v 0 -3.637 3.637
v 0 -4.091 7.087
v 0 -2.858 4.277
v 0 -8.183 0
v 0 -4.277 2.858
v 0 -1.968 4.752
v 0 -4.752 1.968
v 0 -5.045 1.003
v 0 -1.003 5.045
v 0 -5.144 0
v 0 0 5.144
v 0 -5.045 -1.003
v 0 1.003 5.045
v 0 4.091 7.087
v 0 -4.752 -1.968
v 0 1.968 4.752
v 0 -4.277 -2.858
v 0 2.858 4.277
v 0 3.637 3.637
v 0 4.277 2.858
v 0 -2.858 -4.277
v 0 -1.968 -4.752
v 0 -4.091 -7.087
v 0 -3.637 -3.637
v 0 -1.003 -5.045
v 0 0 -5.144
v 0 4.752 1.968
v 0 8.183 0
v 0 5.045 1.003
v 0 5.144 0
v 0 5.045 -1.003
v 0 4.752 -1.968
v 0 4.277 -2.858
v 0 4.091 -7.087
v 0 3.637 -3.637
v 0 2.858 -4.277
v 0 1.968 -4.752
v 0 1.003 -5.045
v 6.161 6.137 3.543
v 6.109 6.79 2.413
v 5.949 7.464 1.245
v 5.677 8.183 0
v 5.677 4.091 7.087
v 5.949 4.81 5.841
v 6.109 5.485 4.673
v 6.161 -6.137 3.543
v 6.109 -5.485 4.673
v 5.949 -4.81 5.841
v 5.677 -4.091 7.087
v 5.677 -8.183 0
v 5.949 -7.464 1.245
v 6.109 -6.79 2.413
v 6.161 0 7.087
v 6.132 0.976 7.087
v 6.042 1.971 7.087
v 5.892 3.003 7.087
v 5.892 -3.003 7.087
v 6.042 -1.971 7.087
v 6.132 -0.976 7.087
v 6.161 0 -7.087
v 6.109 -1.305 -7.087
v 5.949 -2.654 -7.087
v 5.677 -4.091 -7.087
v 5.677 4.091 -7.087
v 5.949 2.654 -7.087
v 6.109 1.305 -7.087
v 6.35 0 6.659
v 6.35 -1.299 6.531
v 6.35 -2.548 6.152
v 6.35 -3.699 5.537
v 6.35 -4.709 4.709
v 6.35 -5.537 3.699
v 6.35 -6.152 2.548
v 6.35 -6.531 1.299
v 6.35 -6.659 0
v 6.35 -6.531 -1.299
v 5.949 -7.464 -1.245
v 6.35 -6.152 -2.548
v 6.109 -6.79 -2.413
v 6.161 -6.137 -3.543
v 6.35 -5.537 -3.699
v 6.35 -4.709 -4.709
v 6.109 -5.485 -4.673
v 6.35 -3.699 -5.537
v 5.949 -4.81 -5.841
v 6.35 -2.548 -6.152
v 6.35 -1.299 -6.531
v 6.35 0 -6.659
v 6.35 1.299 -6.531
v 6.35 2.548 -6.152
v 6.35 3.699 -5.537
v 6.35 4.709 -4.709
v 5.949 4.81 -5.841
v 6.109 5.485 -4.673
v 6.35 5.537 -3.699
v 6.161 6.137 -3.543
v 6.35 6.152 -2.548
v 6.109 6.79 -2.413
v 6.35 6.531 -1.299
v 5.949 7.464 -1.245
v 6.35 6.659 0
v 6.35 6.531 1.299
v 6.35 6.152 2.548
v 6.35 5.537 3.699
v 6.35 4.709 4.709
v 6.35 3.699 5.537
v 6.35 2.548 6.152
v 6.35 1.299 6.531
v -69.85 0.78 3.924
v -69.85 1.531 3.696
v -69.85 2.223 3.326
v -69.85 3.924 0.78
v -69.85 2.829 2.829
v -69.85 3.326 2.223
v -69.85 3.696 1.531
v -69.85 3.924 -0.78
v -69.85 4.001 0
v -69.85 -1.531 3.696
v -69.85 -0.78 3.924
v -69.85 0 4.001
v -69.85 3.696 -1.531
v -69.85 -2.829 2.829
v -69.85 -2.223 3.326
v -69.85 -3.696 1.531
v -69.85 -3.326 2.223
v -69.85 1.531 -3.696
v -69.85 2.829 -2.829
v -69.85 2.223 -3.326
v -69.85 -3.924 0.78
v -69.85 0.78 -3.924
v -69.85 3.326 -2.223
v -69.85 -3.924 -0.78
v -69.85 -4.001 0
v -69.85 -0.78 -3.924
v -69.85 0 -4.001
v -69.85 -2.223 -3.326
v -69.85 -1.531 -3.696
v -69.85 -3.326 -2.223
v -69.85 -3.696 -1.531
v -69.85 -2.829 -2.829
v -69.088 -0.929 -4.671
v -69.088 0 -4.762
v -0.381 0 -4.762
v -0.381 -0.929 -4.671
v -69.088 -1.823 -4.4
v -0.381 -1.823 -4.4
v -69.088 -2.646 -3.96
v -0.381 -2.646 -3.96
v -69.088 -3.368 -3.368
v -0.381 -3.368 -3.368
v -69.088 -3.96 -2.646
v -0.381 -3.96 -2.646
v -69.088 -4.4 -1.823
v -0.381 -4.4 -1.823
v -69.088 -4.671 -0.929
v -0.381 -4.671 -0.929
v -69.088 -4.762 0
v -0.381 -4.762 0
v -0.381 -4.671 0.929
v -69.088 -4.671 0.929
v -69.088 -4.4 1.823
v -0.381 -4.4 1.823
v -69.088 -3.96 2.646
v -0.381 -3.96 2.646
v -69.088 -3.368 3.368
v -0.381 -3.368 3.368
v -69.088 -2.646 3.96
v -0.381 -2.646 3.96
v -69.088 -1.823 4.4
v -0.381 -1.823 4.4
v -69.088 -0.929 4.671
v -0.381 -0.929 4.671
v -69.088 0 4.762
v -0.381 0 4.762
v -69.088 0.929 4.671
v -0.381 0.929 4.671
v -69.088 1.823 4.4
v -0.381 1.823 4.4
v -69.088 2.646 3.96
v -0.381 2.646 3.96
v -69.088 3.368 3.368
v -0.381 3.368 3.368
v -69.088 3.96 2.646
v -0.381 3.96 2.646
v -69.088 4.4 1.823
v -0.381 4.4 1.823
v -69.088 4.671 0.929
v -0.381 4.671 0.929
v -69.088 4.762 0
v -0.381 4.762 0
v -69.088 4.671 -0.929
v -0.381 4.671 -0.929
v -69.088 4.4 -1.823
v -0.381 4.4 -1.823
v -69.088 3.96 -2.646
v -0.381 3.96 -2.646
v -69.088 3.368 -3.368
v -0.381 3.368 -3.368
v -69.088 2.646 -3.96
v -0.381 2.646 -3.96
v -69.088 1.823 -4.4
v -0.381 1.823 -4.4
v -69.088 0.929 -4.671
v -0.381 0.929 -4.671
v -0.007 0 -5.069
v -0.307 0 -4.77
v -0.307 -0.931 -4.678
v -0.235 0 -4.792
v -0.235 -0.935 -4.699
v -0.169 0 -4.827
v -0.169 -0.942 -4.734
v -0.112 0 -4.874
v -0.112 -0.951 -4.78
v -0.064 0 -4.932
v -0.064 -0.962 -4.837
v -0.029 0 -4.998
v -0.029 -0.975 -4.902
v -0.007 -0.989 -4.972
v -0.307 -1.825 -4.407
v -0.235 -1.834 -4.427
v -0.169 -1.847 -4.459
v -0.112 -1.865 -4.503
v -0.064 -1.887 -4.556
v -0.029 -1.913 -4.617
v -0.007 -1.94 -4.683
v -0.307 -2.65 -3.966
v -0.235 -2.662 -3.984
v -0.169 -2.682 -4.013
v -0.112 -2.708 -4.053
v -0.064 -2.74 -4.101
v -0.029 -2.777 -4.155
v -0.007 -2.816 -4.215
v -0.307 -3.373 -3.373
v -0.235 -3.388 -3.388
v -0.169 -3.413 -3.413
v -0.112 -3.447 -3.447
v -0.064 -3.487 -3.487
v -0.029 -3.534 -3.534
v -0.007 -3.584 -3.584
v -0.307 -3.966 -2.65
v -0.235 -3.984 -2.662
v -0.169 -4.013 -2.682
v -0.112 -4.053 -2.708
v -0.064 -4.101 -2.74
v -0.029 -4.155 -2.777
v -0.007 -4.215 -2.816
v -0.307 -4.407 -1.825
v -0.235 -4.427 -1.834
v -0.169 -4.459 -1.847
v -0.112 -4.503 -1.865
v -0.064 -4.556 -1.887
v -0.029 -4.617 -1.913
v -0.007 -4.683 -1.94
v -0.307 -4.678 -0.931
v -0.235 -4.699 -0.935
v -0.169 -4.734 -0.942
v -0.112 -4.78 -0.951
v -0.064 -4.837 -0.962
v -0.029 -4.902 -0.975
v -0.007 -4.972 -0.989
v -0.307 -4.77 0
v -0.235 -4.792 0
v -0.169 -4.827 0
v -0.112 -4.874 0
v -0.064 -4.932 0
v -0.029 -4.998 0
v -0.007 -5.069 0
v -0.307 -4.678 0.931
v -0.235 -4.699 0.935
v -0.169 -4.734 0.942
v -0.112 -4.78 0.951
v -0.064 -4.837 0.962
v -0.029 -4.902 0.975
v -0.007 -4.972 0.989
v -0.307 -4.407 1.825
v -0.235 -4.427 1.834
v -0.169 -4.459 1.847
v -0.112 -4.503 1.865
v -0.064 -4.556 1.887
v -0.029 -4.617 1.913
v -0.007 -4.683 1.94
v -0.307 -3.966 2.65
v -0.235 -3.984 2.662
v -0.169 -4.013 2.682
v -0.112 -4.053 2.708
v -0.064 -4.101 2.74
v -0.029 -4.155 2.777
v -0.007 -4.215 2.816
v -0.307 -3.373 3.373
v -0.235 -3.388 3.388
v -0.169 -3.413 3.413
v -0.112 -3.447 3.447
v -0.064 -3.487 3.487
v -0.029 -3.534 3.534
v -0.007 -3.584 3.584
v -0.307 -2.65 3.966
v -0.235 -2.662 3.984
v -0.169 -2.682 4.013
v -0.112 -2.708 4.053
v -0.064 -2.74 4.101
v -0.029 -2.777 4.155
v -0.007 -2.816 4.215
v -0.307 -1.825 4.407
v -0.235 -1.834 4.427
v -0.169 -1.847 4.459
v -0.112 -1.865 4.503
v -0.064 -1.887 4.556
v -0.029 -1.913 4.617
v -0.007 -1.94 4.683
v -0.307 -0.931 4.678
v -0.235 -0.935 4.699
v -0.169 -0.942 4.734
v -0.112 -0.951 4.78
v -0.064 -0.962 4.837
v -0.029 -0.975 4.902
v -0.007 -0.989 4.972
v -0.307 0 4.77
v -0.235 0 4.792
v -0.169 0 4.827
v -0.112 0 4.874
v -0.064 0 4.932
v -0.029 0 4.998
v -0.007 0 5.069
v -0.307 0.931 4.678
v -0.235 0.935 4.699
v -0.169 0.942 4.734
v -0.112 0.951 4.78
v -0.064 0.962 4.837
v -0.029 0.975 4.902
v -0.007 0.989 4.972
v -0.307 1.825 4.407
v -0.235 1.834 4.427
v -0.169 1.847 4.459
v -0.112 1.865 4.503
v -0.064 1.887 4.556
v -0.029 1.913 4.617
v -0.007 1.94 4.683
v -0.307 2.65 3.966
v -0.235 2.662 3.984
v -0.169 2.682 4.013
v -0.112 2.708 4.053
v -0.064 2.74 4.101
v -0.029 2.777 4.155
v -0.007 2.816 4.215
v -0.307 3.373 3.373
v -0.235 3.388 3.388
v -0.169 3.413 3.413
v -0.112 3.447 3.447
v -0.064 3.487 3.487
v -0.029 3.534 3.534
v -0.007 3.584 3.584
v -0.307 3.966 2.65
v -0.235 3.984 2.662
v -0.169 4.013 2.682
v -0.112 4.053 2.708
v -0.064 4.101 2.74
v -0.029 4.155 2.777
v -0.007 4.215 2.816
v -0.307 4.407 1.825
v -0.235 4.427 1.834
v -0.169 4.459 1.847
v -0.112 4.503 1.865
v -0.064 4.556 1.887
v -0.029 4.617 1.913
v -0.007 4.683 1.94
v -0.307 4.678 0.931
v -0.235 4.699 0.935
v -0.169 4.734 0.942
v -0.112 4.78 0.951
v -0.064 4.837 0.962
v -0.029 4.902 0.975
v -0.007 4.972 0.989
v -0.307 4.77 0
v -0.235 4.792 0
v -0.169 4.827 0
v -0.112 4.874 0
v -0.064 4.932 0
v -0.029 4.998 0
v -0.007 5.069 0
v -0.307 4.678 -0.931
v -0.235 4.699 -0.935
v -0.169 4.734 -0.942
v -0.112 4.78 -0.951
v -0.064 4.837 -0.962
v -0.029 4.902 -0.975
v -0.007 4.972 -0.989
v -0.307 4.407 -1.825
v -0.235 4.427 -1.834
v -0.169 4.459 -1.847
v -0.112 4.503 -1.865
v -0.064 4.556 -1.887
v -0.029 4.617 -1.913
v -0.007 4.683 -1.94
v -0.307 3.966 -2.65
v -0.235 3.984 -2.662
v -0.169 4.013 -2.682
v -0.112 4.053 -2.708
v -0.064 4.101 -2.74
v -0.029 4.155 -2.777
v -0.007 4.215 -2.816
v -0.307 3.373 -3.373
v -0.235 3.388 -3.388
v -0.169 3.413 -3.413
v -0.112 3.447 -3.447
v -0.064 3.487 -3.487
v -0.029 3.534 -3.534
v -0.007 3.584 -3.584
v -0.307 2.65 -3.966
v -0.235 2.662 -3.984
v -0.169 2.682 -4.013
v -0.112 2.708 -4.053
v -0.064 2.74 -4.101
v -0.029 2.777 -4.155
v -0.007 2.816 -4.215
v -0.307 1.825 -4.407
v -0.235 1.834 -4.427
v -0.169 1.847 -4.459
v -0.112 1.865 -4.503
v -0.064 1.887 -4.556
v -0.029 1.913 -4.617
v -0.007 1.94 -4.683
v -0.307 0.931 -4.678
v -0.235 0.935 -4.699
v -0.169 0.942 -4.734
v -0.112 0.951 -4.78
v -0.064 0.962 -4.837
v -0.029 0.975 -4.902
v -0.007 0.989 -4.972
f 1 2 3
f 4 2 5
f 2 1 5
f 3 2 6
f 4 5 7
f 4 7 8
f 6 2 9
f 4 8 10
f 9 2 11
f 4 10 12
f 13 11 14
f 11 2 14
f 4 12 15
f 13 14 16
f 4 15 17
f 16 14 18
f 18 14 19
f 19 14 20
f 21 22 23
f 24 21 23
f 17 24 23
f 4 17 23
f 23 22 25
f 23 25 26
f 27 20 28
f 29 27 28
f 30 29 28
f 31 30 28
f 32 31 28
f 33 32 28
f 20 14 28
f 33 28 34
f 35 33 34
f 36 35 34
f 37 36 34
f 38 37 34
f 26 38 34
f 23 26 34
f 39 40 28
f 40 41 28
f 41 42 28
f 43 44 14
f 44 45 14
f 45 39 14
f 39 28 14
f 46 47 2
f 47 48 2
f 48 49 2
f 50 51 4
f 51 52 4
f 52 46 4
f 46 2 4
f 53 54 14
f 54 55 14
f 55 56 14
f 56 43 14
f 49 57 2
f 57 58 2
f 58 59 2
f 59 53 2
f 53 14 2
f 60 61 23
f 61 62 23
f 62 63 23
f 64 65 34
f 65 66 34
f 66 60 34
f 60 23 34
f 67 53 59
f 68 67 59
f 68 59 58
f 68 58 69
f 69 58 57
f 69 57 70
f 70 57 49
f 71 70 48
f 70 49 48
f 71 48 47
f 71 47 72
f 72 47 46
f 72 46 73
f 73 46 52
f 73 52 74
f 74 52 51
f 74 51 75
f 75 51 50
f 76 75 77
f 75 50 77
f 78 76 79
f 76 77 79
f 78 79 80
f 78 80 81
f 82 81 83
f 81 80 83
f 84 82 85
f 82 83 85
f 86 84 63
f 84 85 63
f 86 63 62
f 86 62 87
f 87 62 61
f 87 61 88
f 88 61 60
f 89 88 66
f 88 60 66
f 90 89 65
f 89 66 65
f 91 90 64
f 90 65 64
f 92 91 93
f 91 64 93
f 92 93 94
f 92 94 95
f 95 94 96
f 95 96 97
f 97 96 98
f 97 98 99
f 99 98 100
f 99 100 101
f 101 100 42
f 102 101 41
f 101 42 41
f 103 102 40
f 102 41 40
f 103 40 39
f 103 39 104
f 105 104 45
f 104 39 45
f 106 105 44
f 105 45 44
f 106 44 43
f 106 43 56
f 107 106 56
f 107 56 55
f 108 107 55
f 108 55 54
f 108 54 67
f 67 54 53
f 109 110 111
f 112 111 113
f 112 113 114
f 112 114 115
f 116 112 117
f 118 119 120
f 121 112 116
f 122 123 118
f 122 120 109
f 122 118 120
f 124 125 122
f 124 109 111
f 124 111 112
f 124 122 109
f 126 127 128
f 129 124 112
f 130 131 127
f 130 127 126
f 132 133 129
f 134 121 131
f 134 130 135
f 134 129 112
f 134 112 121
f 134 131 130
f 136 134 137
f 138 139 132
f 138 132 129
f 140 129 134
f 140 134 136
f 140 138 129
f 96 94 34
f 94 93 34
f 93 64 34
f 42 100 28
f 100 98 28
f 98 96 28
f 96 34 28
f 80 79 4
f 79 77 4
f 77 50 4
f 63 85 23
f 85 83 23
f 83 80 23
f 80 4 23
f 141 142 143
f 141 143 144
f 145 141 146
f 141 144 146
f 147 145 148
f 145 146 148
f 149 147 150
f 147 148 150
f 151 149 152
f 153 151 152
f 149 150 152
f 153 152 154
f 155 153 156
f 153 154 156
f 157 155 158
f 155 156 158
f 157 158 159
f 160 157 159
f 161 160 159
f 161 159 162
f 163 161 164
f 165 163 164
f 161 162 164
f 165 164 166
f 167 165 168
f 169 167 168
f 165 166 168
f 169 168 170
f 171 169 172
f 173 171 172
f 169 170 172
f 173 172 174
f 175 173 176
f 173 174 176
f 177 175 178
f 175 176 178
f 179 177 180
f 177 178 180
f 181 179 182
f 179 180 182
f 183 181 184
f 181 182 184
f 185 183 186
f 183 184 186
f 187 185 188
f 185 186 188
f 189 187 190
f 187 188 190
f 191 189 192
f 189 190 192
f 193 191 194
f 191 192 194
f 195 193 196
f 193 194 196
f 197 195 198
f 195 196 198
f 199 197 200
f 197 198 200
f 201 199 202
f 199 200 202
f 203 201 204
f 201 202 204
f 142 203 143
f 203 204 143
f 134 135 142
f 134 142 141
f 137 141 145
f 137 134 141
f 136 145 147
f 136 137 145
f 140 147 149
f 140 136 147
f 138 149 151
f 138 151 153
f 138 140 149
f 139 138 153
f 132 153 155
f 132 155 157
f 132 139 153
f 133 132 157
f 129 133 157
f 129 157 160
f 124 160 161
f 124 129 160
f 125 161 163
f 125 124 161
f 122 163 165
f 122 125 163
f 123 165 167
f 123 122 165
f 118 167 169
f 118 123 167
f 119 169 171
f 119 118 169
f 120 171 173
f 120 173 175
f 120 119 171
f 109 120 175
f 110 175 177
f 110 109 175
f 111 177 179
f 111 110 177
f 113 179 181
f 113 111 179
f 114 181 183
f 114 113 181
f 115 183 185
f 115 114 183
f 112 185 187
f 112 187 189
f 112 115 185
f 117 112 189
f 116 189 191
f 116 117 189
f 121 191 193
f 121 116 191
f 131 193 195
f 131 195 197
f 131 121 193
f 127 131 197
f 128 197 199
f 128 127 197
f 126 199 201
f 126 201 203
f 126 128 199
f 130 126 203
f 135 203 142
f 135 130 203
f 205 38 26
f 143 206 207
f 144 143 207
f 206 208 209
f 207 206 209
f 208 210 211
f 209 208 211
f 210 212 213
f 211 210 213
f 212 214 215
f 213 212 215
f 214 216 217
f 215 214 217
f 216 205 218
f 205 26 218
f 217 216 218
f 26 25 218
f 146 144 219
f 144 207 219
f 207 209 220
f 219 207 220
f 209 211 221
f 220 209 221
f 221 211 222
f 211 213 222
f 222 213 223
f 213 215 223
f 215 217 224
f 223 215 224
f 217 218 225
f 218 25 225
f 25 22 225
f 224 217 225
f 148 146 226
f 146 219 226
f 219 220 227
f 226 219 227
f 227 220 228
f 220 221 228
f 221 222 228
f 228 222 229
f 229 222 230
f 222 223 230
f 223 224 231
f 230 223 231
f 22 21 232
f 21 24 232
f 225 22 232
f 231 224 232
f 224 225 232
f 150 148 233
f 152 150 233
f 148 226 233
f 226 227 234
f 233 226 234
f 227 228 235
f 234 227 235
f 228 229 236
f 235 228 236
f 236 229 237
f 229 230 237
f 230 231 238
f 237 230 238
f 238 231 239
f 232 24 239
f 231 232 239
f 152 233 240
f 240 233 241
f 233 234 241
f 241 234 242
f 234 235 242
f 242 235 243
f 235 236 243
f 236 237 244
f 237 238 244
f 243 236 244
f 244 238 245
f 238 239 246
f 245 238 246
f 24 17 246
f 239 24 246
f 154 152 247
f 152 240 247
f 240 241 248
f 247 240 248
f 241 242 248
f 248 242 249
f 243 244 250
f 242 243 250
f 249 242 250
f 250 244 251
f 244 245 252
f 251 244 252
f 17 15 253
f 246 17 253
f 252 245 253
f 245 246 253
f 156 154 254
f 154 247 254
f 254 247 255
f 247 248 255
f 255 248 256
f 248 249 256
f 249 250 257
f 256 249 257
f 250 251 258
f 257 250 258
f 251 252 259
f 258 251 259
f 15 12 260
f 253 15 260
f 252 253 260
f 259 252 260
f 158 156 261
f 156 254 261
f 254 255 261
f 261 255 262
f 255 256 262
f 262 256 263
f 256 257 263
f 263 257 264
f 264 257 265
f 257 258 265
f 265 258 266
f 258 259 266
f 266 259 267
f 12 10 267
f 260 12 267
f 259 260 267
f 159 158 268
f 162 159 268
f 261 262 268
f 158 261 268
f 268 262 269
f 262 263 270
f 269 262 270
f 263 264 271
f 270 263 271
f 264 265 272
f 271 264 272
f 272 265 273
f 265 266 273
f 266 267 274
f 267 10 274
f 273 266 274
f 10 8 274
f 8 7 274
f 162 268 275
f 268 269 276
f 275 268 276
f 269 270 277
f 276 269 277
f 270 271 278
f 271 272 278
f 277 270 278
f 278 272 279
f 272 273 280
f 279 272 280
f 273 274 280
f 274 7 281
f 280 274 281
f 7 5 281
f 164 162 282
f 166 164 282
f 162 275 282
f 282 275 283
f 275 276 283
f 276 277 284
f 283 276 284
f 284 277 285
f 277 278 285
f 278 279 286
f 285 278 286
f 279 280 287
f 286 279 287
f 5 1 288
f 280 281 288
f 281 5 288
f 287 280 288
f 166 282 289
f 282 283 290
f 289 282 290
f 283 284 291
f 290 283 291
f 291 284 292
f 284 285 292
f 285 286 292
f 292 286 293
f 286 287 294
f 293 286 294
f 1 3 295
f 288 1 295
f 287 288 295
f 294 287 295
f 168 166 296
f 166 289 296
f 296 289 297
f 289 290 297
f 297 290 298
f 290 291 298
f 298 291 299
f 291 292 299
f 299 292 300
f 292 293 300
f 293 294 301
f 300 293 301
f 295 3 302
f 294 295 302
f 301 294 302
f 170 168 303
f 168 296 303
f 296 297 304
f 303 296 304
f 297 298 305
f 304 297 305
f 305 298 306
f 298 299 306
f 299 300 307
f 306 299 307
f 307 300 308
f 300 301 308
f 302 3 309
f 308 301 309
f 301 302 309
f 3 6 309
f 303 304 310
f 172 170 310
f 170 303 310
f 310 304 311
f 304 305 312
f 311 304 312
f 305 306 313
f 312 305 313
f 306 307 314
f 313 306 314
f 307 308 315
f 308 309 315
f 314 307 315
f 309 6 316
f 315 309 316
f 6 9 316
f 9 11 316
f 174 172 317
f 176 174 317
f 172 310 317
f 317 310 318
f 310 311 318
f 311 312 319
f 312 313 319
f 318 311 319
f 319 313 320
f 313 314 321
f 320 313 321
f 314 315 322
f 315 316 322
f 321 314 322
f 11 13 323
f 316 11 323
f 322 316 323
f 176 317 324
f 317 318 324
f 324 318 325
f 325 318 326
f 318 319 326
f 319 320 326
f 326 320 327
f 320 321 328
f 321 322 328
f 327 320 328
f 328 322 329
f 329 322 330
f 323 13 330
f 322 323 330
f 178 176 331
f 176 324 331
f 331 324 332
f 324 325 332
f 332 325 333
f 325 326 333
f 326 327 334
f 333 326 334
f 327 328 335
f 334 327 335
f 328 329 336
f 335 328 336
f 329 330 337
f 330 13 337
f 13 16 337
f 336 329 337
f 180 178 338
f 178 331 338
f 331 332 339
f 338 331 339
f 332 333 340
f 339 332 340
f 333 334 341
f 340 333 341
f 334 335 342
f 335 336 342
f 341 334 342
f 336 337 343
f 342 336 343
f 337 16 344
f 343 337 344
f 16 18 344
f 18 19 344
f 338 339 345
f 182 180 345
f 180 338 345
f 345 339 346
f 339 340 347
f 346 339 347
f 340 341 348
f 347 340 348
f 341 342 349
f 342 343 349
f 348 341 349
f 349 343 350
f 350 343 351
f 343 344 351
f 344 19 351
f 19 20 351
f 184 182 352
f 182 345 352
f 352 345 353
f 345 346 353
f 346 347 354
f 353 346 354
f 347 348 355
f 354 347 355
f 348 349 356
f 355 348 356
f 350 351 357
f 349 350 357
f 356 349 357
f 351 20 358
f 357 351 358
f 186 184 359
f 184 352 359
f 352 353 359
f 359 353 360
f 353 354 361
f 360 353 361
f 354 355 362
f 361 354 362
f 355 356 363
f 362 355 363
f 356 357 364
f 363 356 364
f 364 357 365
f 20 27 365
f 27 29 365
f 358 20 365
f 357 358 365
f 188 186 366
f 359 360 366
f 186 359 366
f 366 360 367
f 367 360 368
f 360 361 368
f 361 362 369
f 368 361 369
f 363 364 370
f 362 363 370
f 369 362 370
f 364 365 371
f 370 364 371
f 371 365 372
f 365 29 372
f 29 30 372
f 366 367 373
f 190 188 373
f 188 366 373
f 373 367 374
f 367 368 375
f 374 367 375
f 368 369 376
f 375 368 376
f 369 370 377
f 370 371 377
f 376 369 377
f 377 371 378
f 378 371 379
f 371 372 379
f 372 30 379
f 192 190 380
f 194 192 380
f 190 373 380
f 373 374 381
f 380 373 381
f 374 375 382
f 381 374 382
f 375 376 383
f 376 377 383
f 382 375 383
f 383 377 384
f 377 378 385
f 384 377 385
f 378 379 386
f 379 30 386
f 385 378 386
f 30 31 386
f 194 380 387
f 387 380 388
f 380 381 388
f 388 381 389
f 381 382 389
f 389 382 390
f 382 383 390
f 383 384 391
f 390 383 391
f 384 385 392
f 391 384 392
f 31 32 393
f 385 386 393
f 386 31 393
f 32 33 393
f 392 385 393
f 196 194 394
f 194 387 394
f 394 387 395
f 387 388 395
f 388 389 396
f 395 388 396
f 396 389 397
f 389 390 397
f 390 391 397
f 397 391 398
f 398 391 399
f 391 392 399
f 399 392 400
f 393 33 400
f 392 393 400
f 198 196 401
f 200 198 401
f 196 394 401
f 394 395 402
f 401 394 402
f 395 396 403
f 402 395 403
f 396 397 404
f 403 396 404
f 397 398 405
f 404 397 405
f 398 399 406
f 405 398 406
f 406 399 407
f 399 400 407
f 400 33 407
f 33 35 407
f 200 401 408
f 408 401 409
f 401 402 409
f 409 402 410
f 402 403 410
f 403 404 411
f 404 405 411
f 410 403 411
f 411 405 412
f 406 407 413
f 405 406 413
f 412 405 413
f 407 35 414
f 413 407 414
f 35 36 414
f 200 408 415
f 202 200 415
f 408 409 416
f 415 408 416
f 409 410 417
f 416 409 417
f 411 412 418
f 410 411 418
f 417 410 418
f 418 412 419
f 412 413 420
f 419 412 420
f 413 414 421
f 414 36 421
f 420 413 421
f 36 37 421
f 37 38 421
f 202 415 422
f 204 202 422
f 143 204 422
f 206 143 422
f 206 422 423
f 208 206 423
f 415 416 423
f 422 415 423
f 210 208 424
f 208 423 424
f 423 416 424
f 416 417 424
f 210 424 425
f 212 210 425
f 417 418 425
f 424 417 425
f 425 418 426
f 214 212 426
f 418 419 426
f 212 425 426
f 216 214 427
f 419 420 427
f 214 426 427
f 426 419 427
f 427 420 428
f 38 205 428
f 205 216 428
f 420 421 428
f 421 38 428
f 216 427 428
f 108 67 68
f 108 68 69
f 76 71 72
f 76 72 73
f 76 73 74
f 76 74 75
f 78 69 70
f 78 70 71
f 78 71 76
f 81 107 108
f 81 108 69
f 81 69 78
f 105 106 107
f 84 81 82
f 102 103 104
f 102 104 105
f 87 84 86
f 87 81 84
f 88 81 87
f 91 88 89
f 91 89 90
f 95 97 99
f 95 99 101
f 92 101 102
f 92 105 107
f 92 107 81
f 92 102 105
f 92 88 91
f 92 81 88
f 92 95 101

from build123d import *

# Parameters (mm, degrees)
HEX_HEAD_DEPTH  = 6.35
SKETCH3_R       = 4.7625
BOLT_BODY_DEPTH = 69.85
CHAMFER1_SIZE   = 0.762
FILLET1_R       = 0.381


with BuildPart() as part:
    # Sketch1 → HEX-HEAD (new body)
    with BuildSketch(Plane(origin=(0, 0, 0), x_dir=(0, 0, -1), z_dir=(1, 0, 0))):
        Polygon((0, 8.182900835), (-7.0866, 4.091450418), (-7.0866, -4.091450418), (0, -8.182900835), (7.0866, -4.091450418), (7.0866, 4.091450418), align=None)
    extrude(amount=HEX_HEAD_DEPTH)

    # Sketch2 → EDGE-CUT (revolve, cut)
    with BuildSketch(Plane.XY, mode=Mode.PRIVATE) as edge_cut_sk:
        Polygon((6.35, 6.658900835), (5.67731061, 8.182900835), (6.35, 8.182900835), align=None)
    revolve(edge_cut_sk.sketch.rotate(Axis((0, 0, 0), (1, 0, 0)), 90), axis=Axis((0, 0, 0), (1, 0, 0)), mode=Mode.SUBTRACT)

    # Sketch3 → BOLT-BODY (add)
    with BuildSketch(Plane.ZY):
        with Locations(Location((0, 0, 0), (0, 0, 180))):
            Circle(SKETCH3_R)
    extrude(amount=BOLT_BODY_DEPTH)

    # Chamfer1
    chamfer1_edges = [part.edges().sort_by_distance(p)[0] for p in [
        (-69.85, 0, 4.7625),
    ]]
    chamfer(chamfer1_edges, length=CHAMFER1_SIZE)

    # Fillet1
    fillet1_edges = [part.edges().sort_by_distance(p)[0] for p in [
        (0, 0, 4.7625),
    ]]
    fillet(fillet1_edges, radius=FILLET1_R)


solid = part.part
